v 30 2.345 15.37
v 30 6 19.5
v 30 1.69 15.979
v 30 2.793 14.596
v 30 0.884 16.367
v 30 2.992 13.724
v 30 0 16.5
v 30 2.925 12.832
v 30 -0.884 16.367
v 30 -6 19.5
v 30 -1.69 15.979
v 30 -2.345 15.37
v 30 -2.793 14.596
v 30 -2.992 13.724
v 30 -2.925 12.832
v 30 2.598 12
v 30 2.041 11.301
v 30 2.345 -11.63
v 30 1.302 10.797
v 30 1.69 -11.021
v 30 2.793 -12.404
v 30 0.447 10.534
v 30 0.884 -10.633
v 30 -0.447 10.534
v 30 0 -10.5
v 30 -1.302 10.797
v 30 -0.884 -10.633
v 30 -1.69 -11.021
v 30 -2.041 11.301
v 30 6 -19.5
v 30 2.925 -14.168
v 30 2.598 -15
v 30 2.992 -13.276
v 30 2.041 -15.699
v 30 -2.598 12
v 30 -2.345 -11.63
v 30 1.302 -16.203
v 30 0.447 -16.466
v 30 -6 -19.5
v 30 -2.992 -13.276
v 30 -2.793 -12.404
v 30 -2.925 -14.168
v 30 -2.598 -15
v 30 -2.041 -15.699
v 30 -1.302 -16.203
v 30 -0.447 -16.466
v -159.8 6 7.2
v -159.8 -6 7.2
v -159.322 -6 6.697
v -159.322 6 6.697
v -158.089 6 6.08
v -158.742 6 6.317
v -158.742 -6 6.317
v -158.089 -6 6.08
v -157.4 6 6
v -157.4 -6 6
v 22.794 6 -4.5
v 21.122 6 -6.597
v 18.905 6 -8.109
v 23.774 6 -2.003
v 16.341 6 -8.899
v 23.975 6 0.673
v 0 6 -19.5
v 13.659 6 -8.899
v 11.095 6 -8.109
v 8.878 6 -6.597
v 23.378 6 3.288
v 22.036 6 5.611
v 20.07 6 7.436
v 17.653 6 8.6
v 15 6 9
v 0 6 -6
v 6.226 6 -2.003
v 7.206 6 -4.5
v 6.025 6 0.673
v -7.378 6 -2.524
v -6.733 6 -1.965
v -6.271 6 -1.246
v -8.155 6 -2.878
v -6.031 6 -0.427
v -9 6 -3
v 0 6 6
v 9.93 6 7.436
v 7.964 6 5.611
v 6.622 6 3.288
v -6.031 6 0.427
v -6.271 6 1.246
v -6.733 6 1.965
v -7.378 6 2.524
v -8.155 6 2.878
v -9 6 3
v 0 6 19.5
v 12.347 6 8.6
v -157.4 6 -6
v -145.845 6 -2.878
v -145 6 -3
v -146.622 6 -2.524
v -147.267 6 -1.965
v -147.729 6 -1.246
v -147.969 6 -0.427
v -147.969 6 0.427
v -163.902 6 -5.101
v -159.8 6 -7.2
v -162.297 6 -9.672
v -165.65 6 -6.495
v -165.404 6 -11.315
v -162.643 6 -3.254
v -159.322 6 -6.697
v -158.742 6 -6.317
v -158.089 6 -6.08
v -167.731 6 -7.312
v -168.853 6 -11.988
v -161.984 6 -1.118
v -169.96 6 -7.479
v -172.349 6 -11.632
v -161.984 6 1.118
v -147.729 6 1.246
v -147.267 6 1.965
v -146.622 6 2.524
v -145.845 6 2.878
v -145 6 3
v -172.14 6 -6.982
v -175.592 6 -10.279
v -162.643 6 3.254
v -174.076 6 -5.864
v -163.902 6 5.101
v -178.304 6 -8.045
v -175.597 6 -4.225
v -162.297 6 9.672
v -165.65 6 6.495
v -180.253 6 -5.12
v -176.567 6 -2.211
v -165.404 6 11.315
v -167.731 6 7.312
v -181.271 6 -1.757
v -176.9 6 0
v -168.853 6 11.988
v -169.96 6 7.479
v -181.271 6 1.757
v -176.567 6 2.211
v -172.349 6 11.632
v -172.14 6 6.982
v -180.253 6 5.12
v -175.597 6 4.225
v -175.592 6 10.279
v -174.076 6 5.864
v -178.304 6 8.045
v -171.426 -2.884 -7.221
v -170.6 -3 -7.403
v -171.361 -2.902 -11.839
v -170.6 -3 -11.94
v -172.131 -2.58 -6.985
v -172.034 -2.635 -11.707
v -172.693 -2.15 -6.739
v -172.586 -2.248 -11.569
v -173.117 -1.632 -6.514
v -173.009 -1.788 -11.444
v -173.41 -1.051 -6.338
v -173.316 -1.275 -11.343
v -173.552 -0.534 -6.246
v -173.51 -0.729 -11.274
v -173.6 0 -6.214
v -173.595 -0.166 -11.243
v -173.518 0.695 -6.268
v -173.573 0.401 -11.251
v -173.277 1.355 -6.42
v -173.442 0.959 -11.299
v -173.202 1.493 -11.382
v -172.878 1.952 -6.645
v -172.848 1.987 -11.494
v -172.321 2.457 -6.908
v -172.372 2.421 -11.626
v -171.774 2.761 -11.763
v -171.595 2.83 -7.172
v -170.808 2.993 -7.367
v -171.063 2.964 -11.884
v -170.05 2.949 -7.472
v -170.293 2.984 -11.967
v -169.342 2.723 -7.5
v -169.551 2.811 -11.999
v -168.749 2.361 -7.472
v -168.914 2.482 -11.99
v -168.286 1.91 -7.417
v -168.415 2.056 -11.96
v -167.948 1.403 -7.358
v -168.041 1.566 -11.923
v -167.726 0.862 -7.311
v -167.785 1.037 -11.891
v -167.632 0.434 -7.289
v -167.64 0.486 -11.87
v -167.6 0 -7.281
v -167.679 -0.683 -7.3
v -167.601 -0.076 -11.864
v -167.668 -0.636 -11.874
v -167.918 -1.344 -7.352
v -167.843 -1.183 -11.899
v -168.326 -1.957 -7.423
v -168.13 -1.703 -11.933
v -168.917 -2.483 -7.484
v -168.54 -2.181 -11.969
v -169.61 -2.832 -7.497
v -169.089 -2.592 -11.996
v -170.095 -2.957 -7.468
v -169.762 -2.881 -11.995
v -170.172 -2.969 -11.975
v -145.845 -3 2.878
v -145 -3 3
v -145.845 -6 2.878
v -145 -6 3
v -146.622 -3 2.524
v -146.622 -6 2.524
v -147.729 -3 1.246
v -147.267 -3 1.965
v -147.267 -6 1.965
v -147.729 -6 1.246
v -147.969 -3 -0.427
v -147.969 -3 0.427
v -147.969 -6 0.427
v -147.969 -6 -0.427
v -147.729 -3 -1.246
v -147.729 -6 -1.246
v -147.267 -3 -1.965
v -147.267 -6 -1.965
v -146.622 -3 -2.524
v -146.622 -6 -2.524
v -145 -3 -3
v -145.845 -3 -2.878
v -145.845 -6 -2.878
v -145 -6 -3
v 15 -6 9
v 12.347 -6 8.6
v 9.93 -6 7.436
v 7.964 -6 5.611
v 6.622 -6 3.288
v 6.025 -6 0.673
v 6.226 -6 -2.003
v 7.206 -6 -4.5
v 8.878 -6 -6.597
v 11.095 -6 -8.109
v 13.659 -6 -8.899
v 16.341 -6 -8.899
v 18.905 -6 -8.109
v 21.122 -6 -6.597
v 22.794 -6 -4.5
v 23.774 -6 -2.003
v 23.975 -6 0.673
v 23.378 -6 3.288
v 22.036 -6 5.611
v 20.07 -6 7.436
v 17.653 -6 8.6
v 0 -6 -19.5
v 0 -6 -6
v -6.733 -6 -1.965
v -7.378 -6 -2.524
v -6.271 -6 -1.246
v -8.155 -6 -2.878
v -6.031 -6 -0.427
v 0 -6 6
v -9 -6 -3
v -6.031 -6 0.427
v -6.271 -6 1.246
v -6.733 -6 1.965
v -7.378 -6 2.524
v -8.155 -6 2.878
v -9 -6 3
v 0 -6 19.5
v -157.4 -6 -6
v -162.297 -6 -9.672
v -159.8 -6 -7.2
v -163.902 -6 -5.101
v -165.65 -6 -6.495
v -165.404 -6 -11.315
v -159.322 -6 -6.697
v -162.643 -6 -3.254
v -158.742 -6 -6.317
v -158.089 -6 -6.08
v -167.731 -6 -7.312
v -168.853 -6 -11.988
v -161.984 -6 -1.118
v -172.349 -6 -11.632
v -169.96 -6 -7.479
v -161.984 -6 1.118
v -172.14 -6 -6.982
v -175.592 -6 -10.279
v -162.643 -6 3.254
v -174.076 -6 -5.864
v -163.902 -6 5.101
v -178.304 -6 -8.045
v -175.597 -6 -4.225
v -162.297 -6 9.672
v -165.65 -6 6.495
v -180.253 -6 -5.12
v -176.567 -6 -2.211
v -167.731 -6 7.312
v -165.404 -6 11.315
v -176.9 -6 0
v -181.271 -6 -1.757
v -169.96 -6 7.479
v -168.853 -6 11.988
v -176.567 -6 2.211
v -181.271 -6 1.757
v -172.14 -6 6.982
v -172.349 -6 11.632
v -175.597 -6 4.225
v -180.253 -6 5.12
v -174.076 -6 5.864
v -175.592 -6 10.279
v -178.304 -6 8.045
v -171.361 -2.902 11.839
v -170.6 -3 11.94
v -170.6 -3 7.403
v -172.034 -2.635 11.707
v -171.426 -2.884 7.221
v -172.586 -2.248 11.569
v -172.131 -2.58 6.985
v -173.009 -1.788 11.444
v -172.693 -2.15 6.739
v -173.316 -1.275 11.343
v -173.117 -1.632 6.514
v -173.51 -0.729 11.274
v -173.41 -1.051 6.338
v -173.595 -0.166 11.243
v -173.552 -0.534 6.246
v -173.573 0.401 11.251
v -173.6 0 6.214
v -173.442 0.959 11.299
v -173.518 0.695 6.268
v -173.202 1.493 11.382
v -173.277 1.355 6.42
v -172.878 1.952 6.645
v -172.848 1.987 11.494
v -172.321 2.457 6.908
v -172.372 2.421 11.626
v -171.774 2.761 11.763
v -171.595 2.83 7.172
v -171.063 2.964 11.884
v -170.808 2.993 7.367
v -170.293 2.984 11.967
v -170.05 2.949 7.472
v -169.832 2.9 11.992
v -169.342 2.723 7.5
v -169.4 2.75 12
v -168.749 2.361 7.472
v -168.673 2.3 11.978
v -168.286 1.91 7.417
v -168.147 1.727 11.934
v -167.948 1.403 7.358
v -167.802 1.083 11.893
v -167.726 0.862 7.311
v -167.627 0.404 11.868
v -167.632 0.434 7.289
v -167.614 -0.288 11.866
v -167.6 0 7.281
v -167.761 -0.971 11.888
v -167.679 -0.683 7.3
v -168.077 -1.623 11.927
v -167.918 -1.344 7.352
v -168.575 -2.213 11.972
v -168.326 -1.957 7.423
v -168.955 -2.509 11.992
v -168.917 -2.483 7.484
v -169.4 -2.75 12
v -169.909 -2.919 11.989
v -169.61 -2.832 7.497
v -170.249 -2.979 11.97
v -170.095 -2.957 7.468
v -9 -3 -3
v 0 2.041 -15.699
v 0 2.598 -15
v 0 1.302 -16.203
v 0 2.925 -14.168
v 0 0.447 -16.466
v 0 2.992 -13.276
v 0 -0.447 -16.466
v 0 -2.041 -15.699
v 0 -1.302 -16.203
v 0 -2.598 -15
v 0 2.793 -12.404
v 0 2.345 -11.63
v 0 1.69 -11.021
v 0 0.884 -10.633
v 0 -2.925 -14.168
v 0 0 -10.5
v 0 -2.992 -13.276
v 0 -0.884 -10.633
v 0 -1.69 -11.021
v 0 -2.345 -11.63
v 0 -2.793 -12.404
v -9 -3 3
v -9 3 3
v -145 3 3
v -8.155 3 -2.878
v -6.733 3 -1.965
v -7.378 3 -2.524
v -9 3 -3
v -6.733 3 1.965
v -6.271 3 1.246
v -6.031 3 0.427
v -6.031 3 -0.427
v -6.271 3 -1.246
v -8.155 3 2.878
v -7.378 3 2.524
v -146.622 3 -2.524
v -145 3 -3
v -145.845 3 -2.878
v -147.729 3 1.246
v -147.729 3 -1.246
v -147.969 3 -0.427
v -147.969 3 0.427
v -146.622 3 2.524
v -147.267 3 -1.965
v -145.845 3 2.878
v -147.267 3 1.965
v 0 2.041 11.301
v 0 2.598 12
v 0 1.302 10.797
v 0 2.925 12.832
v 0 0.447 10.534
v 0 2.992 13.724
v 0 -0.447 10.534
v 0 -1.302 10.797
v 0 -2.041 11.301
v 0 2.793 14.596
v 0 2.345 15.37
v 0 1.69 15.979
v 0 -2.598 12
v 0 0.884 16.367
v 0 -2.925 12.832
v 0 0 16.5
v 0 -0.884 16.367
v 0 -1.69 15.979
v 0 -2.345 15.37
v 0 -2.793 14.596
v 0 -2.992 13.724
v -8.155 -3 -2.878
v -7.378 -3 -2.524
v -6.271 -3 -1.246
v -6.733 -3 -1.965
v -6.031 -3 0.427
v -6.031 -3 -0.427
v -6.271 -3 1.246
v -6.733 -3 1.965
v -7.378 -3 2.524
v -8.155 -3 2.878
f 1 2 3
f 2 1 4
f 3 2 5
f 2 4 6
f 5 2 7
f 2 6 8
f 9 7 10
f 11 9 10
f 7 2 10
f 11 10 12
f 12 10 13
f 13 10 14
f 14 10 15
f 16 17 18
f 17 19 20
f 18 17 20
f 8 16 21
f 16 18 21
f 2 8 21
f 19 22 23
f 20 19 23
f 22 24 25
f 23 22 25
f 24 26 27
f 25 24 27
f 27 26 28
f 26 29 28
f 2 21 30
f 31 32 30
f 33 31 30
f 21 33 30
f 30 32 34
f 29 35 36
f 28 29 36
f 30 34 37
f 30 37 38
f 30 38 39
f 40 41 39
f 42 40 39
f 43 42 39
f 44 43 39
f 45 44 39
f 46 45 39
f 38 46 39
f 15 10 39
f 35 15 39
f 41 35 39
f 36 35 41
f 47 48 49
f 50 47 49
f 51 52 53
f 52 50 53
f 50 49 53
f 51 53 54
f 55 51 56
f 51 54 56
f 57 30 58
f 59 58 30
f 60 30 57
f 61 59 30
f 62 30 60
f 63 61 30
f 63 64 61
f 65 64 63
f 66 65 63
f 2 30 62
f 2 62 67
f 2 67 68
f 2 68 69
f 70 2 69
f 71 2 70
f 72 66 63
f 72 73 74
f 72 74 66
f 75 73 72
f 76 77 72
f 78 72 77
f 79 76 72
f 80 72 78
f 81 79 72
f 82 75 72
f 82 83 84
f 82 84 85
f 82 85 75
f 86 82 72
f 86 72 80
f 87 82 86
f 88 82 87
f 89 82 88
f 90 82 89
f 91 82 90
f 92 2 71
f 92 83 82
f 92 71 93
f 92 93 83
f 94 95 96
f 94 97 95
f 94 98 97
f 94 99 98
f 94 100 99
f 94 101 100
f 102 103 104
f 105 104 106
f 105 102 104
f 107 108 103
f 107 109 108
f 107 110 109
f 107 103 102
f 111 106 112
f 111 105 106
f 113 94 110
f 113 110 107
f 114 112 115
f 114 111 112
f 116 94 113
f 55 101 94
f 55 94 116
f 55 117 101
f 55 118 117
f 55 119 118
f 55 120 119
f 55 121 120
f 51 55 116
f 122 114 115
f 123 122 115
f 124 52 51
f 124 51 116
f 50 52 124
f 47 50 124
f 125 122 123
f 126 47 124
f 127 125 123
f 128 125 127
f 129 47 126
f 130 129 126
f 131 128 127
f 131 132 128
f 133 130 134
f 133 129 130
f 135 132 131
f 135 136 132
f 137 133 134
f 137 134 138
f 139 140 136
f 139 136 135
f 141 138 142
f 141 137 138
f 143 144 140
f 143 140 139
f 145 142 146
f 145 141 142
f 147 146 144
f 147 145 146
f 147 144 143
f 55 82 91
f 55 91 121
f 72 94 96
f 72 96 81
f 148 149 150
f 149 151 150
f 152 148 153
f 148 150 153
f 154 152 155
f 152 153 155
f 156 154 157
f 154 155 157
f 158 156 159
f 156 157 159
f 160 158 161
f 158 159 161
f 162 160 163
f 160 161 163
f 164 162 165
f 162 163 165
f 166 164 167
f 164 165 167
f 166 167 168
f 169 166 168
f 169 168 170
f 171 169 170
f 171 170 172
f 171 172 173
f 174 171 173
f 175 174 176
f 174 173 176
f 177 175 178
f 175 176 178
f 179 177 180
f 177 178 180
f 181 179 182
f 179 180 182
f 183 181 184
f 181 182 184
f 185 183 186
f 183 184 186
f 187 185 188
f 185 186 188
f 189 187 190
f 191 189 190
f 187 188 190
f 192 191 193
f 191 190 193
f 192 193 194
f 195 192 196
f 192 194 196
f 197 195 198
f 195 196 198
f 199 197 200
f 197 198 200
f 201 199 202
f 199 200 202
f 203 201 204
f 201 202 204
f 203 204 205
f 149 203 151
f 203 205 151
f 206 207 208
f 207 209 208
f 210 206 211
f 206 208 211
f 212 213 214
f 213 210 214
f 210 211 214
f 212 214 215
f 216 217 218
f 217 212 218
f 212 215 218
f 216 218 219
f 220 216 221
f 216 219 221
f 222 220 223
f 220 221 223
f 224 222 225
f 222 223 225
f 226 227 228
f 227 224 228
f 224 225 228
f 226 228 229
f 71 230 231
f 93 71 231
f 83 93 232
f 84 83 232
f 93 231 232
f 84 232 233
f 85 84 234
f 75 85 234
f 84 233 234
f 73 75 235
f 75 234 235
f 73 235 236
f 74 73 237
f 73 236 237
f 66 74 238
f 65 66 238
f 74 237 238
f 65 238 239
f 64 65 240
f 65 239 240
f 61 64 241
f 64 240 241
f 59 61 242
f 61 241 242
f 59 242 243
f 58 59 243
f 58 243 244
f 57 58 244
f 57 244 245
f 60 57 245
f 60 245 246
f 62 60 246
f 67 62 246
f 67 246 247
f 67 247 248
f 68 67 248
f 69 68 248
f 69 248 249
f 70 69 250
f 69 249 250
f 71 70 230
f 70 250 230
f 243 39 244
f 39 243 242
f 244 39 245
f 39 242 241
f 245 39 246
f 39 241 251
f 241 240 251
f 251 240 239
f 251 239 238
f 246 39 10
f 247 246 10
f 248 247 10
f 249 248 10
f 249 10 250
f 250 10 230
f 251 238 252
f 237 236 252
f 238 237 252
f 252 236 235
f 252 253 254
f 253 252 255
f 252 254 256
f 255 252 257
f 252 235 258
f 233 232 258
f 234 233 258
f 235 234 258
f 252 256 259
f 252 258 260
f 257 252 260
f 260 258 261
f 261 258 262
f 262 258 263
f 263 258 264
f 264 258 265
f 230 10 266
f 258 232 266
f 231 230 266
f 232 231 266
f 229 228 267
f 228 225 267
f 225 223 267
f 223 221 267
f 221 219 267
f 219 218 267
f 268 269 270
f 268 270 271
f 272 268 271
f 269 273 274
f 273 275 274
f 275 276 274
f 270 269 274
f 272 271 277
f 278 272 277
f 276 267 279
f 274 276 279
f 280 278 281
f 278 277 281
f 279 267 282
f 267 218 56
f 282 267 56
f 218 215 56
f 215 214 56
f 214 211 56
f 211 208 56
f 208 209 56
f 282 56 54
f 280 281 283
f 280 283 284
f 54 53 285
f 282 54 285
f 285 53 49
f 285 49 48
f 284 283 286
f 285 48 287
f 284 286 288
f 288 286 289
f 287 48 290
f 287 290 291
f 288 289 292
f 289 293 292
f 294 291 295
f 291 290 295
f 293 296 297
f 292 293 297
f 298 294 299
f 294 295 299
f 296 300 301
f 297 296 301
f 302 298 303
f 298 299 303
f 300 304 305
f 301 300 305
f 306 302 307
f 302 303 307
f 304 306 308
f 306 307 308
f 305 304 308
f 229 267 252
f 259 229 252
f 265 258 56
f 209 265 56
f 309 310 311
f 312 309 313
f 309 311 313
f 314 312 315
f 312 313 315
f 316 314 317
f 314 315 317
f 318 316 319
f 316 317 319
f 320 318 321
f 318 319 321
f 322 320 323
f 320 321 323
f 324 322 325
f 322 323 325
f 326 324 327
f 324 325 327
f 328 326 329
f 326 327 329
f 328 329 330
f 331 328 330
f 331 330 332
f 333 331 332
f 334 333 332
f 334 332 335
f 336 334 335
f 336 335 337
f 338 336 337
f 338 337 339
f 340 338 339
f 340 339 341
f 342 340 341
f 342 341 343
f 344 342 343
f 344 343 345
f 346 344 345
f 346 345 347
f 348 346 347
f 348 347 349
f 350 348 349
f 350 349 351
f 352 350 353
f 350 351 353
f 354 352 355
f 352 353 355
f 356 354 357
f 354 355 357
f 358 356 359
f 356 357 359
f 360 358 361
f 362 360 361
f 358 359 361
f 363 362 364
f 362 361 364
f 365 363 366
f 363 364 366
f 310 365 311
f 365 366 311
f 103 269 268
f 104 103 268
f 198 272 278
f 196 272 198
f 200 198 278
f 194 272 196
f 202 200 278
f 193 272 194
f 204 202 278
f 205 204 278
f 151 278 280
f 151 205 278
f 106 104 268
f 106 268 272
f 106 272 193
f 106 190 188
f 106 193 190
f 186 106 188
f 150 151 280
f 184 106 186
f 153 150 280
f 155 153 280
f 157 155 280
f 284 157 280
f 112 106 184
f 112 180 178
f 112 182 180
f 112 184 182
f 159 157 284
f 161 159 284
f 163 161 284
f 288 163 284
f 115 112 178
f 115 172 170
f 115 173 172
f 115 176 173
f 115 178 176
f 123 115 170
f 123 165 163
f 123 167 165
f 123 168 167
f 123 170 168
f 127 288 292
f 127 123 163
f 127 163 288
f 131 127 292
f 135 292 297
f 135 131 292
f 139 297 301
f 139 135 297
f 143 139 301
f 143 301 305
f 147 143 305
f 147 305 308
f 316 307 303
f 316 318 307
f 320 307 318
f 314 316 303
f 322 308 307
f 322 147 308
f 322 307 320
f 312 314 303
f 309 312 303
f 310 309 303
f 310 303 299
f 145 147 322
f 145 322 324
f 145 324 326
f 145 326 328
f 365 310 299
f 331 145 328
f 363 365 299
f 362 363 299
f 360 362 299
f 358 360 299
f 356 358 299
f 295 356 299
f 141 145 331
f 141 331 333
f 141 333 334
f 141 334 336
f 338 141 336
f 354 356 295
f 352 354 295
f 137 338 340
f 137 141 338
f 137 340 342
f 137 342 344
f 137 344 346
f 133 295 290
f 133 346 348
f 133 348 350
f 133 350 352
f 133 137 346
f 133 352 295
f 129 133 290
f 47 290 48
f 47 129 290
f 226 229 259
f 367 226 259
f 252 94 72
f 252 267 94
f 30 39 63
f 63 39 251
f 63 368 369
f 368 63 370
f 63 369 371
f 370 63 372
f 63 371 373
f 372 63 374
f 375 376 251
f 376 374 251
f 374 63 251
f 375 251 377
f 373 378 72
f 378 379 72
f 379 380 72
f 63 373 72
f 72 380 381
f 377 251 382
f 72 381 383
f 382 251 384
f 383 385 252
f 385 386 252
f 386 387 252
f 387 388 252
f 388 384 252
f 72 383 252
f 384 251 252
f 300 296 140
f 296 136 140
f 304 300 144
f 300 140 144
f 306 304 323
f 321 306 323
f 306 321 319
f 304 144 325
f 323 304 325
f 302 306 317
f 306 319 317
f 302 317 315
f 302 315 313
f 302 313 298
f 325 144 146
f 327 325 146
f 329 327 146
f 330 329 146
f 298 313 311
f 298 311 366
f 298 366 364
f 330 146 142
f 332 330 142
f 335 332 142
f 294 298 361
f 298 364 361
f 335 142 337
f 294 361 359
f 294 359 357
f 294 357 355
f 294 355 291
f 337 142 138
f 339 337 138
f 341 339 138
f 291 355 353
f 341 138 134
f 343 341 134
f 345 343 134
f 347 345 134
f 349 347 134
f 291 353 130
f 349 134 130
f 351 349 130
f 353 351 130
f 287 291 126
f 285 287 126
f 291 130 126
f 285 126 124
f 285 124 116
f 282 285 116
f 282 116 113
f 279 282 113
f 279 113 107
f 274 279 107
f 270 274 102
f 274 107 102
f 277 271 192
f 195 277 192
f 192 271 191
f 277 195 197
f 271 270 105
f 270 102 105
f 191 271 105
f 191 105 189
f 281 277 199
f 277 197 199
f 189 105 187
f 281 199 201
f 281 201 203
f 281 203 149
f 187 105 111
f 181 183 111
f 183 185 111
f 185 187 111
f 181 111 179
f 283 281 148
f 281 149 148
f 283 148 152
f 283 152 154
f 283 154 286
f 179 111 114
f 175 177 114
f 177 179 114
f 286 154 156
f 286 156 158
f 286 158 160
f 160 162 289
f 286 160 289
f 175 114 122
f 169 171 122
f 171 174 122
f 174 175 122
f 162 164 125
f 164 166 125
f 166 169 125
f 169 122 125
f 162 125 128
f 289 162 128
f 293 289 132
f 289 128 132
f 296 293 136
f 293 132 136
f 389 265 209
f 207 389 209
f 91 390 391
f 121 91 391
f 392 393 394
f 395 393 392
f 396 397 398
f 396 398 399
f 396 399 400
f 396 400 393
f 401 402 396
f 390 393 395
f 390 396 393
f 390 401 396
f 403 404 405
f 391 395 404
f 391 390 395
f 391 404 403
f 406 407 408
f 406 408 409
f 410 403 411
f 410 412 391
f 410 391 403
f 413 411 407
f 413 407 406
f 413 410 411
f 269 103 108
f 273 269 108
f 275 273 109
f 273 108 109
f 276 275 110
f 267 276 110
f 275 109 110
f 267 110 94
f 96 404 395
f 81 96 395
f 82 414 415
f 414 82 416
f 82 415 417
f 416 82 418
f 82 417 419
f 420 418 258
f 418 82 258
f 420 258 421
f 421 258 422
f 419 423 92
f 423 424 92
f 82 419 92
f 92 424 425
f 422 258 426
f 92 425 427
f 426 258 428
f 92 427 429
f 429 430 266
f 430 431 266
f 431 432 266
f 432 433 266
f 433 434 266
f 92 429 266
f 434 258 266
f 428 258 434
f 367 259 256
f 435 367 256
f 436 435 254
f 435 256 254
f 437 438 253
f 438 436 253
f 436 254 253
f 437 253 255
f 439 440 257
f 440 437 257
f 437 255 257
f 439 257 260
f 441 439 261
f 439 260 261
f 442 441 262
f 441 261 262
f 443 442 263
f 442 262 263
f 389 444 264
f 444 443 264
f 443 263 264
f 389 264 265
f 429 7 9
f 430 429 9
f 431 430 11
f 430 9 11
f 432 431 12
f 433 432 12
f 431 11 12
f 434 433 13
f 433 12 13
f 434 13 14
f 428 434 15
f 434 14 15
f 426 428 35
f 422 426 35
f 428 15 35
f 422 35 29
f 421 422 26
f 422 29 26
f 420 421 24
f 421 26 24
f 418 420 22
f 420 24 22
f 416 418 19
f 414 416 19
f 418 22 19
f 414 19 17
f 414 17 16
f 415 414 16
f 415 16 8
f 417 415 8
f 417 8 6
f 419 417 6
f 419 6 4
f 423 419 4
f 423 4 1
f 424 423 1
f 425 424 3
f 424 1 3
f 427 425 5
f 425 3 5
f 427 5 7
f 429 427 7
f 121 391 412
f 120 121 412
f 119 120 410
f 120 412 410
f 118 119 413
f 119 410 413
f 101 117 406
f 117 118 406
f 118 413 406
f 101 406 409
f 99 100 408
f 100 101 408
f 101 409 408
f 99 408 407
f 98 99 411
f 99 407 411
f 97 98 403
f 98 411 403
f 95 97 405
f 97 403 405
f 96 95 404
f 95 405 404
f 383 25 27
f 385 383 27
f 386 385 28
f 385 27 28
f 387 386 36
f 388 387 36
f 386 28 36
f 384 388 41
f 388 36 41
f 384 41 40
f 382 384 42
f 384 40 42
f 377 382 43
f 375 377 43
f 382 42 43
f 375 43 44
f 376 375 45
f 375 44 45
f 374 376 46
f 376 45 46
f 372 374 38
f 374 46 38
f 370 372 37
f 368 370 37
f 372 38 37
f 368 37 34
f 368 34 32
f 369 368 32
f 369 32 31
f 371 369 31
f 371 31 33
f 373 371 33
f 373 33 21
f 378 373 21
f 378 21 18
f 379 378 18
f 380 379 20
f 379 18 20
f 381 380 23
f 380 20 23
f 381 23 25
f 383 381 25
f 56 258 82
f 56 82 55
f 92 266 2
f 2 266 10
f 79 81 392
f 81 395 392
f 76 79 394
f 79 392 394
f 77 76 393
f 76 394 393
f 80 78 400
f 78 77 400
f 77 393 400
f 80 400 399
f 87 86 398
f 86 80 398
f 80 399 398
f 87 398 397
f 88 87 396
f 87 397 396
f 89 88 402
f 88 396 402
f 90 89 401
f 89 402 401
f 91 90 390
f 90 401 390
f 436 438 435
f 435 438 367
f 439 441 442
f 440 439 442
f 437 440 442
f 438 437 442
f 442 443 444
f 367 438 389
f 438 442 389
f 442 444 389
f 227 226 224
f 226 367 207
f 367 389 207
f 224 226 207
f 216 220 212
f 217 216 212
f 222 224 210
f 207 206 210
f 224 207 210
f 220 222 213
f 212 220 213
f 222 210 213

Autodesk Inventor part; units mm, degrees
ref_plane "YZ Plane" through (0, 0, 0) normal (1, 0, 0) x (0, 1, 0)
sketch "Skizze1" plane through (0, 0, 0) normal (0, 1, 0) x (-1, 0, 0)
  line L0 (0, 19.5) -> (-30, 19.5)
  line L1 (-30, 19.5) -> (-30, -19.5)
  line L2 (-30, -19.5) -> (0, -19.5)
  line L3 (0, -19.5) -> (0, 19.5)
  line L4 (0, 6) -> (169.4, 6)
  line L5 (169.4, 6) -> (169.4, -6)
  line L6 (169.4, -6) -> (0, -6)
  line L7 (0, -6) -> (0, 6)
  line L8 (0, 0) -> (-64.3399, 0) construction
  line L9 (9, 0) -> (145, 0) construction
  line L10 (9, 3) -> (145, 3)
  line L11 (145, -3) -> (9, -3)
  arc A0 (9, 3) -> (9, -3) centre (9, 0) ccw
  arc A1 (145, -3) -> (145, 3) centre (145, 0) ccw
  point P0 (169.4, 0)
  point P1 (-15, -19.5)
  point P2 (77, 0)
  point P3 (6, 0)
  point P4 (148, 0)
  dimension "d0" = 39
  dimension "d1" = 30
  dimension "d2" = 184.4
  dimension "d3" = 12
  dimension "d4" = 6
  dimension "d5" = 6
  dimension "d6" = 3
  dimension "d27" = 142
extrude "Extrusion1" add sketch "Skizze1" along normal mid plane 12
extrude "Extrusion2" add sketch "Skizze1" along normal blind 3 contours L10 A1 L11 A0
extrude "Extrusion3" add sketch "Skizze1" against normal blind 3 contours L10 A1 L11 A0
sketch "Skizze2" plane through (0, 6, 0) normal (0, 1, 0) x (1, 0, 0)
  line L0 (30, 19.5) -> (0, 19.5) projected
  point P0 (0, 0)
  point P1 (15, 0)
  point P2 (15, 19.5)
hole "Bohrung1" at (15, 6, 0) direction (0, -1, 0) diameter 18 depth 12
ref_plane "Arbeitsebene1" through (0, 0, 0) normal (0, 1, 0) x (-1, 0, 0)
sketch "Skizze4" plane through (0, 0, 0) normal (0, 1, 0) x (-1, 0, 0)
  line L0 (169.4, 6) -> (169.4, -6) projected
  circle A0 centre (169.4, 0) radius 12
  point P0 (0, 0)
  dimension "d24" = 24
extrude "Extrusion4" add sketch "Skizze4" along normal mid plane 12
sketch "Skizze5" plane through (0, 0, 0) normal (0, 1, 0) x (-1, 0, 0)
  circle A0 centre (169.4, 0) radius 7.5
  arc A1 (159.0077, -6) -> (159.0077, 6) centre (169.4, 0) ccw projected
  point P0 (0, 0)
  dimension "d28" = 15
extrude "Extrusion5" cut sketch "Skizze5" along normal mid plane 12
fillet "Rundung1" radius 3 2 edges at (-159.0077, 0, 6) (-159.0077, 0, -6)
ref_plane "Arbeitsebene2" through (0, 0, 12) normal (0, 0, 1) x (1, 0, 0)
sketch "Skizze6" plane through (0, 0, 12) normal (0, 0, 1) x (1, 0, 0)
  line L0 (-181.4, -6) -> (-181.4, 6) projected
  line L1 (-159.8, -6) -> (-159.8, 6) projected
  line L2 (-159.8, -6) -> (-159.8, -6) projected
  line L3 (-159.8, 6) -> (-159.8, -6) projected
  line L4 (-159.8, 6) -> (-159.8, 6) projected
  line L5 (-159.8, 6) -> (-181.4, 6) projected
  point P0 (0, 0)
  point P1 (-170.6, 0)
  point P2 (-181.4, 0)
  point P3 (-170.6, 6)
hole "Bohrung2" at (-170.6, 0, 12) direction (0, 0, -1) diameter 6 end through all
sketch "Skizze7" plane through (0, -6, 19.5) normal (-1, 0, 0) x (0, 0, 1)
  line L0 (-12, 0) -> (-27, 0) projected
  line L1 (-25.5, 0) -> (-39, 0) projected
  line L2 (-39, 0) -> (0, 0) projected
  line L3 (0, 0) -> (-13.5, 0) projected
  line L4 (-12.3, 0) -> (-13.5, 0) projected
  line L5 (-12.3, 0) -> (-26.7, 0) projected
  line L6 (-25.5, 0) -> (-26.7, 0) projected
  line L7 (-22.5, 0) -> (-16.5, 0) projected
  line L8 (-16.5, 0) -> (-22.5, 0) projected
  line L9 (-10.5, 0) -> (-28.5, 0) projected
  point P0 (-19.5, 6)
  point P1 (-6, 6)
  point P2 (-33, 6)
  point P3 (-6.75, 0)
  dimension "d48" = 6
  dimension "d50" = 13.5
  dimension "d51" = 13.5
hole "Bohrung3" at (0, 0, 13.5) at (0, 0, -13.5) direction (1, 0, 0) diameter 6 end through all
equation "\"d51\" = d50"
properties part number "pleuel_rad_2"
